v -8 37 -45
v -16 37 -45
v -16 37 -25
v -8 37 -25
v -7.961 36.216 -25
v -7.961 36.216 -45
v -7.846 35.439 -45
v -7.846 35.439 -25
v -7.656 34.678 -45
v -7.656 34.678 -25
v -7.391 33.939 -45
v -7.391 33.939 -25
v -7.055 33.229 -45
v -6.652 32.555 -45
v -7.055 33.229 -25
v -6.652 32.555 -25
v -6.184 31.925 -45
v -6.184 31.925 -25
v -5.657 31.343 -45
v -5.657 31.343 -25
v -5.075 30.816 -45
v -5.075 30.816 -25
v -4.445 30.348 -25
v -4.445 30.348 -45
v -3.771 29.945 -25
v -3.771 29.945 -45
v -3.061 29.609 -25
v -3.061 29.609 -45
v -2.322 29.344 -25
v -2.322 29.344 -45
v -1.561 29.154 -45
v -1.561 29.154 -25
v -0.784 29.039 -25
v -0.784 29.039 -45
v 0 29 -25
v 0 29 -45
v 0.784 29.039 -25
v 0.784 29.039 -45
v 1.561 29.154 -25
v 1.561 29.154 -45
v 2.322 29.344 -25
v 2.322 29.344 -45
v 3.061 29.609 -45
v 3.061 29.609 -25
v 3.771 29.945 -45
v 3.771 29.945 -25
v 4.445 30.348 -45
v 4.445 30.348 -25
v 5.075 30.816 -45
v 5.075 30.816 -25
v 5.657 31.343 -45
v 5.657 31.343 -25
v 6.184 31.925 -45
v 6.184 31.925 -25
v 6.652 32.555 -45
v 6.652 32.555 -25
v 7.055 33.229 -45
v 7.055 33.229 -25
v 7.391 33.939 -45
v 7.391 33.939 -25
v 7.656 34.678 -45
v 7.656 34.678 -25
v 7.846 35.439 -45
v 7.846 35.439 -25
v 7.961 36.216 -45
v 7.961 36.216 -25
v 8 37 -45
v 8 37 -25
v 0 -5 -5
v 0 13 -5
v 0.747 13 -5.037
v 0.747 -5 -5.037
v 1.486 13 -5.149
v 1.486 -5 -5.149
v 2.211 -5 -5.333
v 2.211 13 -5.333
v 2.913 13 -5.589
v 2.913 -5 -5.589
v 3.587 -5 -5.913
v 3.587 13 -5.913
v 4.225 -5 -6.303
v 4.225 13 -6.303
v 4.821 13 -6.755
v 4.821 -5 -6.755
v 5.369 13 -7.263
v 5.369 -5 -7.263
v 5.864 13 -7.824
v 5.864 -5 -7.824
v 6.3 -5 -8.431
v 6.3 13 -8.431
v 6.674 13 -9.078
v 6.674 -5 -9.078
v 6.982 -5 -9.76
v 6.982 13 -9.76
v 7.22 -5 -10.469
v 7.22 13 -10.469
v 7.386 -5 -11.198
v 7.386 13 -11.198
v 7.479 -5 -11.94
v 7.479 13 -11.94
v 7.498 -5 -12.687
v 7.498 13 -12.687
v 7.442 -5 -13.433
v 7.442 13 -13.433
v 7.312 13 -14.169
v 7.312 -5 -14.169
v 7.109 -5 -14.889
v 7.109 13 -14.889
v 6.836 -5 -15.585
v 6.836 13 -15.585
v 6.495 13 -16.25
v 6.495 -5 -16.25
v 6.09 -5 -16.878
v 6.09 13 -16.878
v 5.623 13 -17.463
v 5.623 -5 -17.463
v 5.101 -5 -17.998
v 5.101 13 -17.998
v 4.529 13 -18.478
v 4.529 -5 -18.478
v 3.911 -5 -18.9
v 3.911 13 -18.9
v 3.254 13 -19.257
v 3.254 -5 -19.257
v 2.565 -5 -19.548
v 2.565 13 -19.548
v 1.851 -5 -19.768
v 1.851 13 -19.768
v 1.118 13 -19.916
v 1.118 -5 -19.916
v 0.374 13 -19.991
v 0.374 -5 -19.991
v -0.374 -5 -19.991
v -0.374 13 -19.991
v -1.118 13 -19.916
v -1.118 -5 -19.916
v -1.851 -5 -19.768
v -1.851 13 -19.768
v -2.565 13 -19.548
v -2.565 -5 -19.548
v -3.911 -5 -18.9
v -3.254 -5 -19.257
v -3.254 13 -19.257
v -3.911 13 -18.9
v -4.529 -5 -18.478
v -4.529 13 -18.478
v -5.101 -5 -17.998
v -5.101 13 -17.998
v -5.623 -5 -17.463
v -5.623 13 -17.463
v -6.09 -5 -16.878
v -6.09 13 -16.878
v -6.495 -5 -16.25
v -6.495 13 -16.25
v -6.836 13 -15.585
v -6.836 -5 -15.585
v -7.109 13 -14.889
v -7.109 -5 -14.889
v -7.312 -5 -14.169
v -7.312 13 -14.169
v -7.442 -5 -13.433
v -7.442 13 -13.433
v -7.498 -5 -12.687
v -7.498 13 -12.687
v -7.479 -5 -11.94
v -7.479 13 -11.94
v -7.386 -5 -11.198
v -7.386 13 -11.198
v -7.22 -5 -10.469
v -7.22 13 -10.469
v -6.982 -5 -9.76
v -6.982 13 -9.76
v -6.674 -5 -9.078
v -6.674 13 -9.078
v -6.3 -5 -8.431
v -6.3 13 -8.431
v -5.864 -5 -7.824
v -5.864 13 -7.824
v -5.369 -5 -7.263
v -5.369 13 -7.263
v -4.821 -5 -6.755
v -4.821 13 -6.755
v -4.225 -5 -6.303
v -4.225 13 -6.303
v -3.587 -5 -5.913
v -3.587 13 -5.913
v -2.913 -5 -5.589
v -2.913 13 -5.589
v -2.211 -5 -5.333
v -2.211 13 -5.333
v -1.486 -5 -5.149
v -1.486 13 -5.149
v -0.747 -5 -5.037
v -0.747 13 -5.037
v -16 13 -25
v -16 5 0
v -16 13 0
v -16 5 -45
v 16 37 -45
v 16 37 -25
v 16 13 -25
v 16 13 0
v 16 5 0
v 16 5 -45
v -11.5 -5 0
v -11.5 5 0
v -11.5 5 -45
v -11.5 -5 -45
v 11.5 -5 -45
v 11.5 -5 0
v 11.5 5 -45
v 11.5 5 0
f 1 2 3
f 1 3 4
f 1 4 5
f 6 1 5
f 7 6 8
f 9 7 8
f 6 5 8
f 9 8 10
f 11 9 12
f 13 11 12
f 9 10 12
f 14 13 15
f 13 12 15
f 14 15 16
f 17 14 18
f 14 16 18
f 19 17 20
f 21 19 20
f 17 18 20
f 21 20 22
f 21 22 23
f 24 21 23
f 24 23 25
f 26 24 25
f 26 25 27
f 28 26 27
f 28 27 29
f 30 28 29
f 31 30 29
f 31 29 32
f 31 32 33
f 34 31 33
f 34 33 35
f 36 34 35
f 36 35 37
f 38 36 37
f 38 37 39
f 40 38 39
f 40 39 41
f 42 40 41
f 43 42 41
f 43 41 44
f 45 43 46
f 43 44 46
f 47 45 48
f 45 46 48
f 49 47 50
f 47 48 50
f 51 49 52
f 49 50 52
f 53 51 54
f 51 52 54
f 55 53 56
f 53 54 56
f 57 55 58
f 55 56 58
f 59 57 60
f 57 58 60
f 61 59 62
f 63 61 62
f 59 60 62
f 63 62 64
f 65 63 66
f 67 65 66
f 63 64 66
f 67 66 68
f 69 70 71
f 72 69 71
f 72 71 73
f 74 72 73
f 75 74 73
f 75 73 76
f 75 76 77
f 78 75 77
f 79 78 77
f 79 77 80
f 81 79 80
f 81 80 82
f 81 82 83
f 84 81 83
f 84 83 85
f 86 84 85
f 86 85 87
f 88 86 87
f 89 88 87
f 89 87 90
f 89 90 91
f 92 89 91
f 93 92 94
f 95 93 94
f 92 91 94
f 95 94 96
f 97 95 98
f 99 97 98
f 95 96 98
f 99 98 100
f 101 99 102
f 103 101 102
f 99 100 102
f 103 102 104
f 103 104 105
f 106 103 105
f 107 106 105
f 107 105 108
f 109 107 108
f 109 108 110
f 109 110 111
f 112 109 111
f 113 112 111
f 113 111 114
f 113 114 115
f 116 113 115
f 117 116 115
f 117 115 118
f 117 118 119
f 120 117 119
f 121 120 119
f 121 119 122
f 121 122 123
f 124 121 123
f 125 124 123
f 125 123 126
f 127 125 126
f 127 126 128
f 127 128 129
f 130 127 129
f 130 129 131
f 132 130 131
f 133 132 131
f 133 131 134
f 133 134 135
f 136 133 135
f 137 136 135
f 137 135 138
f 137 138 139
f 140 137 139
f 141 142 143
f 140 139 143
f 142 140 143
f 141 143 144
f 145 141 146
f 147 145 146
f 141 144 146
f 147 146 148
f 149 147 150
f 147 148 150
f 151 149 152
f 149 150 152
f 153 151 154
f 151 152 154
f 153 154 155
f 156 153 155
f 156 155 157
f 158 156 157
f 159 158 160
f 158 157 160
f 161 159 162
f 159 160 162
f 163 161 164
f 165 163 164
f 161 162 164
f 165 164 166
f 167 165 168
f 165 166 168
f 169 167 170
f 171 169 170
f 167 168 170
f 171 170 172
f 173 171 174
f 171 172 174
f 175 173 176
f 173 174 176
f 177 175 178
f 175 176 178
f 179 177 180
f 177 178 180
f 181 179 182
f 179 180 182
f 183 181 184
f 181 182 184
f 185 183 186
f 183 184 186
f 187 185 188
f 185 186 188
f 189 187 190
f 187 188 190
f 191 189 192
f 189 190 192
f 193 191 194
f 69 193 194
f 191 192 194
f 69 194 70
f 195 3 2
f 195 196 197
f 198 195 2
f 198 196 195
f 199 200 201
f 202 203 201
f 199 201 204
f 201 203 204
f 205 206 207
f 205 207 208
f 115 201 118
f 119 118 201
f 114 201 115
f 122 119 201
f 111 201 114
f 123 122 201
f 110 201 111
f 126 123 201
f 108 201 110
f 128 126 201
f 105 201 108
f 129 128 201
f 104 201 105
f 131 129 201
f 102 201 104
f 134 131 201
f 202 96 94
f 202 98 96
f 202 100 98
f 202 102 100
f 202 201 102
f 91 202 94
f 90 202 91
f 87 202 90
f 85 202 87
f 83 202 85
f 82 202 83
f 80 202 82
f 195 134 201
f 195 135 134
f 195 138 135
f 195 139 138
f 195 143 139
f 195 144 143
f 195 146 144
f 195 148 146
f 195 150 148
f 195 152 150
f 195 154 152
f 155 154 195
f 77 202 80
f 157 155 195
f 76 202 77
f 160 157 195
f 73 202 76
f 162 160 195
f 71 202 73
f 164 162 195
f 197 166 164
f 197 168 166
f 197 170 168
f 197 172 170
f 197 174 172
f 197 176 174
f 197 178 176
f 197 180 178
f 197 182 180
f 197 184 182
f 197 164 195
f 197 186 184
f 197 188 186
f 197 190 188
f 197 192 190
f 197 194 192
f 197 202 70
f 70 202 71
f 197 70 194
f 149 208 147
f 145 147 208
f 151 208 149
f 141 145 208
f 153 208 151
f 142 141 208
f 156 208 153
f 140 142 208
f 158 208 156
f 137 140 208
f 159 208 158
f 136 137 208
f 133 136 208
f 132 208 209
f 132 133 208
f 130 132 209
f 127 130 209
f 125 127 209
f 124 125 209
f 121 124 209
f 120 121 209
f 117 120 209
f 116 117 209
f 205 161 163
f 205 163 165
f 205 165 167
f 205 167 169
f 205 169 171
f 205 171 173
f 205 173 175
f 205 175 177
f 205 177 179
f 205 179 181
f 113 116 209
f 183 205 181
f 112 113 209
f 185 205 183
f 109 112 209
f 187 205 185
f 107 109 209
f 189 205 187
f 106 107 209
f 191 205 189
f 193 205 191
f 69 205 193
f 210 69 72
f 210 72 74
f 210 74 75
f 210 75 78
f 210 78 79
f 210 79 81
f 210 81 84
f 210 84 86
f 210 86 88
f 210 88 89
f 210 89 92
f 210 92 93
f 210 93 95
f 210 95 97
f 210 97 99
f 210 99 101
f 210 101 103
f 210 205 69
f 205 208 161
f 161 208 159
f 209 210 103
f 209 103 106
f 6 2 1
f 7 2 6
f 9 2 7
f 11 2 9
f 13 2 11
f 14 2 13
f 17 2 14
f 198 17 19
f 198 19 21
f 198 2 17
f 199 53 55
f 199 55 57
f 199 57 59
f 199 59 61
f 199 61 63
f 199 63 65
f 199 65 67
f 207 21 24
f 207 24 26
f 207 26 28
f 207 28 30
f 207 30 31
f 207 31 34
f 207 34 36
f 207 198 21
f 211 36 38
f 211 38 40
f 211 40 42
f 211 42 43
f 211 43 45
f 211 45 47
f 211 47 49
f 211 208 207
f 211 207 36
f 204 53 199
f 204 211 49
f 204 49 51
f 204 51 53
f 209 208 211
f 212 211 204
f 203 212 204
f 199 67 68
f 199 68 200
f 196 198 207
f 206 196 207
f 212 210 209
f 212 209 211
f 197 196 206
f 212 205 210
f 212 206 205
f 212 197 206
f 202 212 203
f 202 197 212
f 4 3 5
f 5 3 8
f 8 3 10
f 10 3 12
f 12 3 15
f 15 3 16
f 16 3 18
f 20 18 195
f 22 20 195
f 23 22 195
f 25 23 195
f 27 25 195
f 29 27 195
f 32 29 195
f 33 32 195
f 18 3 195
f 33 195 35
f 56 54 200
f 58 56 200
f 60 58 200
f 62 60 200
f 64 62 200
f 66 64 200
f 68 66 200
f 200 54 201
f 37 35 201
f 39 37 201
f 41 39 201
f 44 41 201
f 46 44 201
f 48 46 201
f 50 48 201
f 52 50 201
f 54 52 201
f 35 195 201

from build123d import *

# Parameters (mm, degrees)
EXTRUDE_1_DEPTH     = 45
SKETCH_2_R          = 7.5
CUT_EXTRUDE_2_DEPTH = 24
SKETCH_3_W          = 32
SKETCH_3_H          = 20
EXTRUDE_4_DEPTH     = 24
SKETCH_4_R          = 8
CUT_EXTRUDE_3_DEPTH = 24


with BuildPart() as part:
    # 草图1 → 凸台-拉伸1 (new body)
    with BuildSketch(Plane.XY):
        Polygon((-11.5, -5), (11.5, -5), (11.5, 5), (16, 5), (16, 13), (-16, 13), (-16, 5), (-11.5, 5), align=None)
    extrude(amount=-EXTRUDE_1_DEPTH)

    # 草图2 → 切除-拉伸2 (cut)
    with BuildSketch(Plane(origin=(0, 13, 0), x_dir=(1, 0, 0), z_dir=(0, 1, 0))):
        with Locations(Location((0, 12.5, 0), (0, 0, 270))):
            Circle(SKETCH_2_R)
    extrude(amount=-CUT_EXTRUDE_2_DEPTH, mode=Mode.SUBTRACT)

    # 草图3 → 凸台-拉伸4 (add)
    with BuildSketch(Plane(origin=(0, 13, 0), x_dir=(1, 0, 0), z_dir=(0, 1, 0))):
        with Locations((0, 35)):
            Rectangle(SKETCH_3_W, SKETCH_3_H)
    extrude(amount=EXTRUDE_4_DEPTH)

    # 草图4 → 切除-拉伸3 (cut)
    with BuildSketch(Plane.XY.offset(-25)):
        with Locations((0, 37)):
            Circle(SKETCH_4_R)
    extrude(amount=-CUT_EXTRUDE_3_DEPTH, mode=Mode.SUBTRACT)


solid = part.part
